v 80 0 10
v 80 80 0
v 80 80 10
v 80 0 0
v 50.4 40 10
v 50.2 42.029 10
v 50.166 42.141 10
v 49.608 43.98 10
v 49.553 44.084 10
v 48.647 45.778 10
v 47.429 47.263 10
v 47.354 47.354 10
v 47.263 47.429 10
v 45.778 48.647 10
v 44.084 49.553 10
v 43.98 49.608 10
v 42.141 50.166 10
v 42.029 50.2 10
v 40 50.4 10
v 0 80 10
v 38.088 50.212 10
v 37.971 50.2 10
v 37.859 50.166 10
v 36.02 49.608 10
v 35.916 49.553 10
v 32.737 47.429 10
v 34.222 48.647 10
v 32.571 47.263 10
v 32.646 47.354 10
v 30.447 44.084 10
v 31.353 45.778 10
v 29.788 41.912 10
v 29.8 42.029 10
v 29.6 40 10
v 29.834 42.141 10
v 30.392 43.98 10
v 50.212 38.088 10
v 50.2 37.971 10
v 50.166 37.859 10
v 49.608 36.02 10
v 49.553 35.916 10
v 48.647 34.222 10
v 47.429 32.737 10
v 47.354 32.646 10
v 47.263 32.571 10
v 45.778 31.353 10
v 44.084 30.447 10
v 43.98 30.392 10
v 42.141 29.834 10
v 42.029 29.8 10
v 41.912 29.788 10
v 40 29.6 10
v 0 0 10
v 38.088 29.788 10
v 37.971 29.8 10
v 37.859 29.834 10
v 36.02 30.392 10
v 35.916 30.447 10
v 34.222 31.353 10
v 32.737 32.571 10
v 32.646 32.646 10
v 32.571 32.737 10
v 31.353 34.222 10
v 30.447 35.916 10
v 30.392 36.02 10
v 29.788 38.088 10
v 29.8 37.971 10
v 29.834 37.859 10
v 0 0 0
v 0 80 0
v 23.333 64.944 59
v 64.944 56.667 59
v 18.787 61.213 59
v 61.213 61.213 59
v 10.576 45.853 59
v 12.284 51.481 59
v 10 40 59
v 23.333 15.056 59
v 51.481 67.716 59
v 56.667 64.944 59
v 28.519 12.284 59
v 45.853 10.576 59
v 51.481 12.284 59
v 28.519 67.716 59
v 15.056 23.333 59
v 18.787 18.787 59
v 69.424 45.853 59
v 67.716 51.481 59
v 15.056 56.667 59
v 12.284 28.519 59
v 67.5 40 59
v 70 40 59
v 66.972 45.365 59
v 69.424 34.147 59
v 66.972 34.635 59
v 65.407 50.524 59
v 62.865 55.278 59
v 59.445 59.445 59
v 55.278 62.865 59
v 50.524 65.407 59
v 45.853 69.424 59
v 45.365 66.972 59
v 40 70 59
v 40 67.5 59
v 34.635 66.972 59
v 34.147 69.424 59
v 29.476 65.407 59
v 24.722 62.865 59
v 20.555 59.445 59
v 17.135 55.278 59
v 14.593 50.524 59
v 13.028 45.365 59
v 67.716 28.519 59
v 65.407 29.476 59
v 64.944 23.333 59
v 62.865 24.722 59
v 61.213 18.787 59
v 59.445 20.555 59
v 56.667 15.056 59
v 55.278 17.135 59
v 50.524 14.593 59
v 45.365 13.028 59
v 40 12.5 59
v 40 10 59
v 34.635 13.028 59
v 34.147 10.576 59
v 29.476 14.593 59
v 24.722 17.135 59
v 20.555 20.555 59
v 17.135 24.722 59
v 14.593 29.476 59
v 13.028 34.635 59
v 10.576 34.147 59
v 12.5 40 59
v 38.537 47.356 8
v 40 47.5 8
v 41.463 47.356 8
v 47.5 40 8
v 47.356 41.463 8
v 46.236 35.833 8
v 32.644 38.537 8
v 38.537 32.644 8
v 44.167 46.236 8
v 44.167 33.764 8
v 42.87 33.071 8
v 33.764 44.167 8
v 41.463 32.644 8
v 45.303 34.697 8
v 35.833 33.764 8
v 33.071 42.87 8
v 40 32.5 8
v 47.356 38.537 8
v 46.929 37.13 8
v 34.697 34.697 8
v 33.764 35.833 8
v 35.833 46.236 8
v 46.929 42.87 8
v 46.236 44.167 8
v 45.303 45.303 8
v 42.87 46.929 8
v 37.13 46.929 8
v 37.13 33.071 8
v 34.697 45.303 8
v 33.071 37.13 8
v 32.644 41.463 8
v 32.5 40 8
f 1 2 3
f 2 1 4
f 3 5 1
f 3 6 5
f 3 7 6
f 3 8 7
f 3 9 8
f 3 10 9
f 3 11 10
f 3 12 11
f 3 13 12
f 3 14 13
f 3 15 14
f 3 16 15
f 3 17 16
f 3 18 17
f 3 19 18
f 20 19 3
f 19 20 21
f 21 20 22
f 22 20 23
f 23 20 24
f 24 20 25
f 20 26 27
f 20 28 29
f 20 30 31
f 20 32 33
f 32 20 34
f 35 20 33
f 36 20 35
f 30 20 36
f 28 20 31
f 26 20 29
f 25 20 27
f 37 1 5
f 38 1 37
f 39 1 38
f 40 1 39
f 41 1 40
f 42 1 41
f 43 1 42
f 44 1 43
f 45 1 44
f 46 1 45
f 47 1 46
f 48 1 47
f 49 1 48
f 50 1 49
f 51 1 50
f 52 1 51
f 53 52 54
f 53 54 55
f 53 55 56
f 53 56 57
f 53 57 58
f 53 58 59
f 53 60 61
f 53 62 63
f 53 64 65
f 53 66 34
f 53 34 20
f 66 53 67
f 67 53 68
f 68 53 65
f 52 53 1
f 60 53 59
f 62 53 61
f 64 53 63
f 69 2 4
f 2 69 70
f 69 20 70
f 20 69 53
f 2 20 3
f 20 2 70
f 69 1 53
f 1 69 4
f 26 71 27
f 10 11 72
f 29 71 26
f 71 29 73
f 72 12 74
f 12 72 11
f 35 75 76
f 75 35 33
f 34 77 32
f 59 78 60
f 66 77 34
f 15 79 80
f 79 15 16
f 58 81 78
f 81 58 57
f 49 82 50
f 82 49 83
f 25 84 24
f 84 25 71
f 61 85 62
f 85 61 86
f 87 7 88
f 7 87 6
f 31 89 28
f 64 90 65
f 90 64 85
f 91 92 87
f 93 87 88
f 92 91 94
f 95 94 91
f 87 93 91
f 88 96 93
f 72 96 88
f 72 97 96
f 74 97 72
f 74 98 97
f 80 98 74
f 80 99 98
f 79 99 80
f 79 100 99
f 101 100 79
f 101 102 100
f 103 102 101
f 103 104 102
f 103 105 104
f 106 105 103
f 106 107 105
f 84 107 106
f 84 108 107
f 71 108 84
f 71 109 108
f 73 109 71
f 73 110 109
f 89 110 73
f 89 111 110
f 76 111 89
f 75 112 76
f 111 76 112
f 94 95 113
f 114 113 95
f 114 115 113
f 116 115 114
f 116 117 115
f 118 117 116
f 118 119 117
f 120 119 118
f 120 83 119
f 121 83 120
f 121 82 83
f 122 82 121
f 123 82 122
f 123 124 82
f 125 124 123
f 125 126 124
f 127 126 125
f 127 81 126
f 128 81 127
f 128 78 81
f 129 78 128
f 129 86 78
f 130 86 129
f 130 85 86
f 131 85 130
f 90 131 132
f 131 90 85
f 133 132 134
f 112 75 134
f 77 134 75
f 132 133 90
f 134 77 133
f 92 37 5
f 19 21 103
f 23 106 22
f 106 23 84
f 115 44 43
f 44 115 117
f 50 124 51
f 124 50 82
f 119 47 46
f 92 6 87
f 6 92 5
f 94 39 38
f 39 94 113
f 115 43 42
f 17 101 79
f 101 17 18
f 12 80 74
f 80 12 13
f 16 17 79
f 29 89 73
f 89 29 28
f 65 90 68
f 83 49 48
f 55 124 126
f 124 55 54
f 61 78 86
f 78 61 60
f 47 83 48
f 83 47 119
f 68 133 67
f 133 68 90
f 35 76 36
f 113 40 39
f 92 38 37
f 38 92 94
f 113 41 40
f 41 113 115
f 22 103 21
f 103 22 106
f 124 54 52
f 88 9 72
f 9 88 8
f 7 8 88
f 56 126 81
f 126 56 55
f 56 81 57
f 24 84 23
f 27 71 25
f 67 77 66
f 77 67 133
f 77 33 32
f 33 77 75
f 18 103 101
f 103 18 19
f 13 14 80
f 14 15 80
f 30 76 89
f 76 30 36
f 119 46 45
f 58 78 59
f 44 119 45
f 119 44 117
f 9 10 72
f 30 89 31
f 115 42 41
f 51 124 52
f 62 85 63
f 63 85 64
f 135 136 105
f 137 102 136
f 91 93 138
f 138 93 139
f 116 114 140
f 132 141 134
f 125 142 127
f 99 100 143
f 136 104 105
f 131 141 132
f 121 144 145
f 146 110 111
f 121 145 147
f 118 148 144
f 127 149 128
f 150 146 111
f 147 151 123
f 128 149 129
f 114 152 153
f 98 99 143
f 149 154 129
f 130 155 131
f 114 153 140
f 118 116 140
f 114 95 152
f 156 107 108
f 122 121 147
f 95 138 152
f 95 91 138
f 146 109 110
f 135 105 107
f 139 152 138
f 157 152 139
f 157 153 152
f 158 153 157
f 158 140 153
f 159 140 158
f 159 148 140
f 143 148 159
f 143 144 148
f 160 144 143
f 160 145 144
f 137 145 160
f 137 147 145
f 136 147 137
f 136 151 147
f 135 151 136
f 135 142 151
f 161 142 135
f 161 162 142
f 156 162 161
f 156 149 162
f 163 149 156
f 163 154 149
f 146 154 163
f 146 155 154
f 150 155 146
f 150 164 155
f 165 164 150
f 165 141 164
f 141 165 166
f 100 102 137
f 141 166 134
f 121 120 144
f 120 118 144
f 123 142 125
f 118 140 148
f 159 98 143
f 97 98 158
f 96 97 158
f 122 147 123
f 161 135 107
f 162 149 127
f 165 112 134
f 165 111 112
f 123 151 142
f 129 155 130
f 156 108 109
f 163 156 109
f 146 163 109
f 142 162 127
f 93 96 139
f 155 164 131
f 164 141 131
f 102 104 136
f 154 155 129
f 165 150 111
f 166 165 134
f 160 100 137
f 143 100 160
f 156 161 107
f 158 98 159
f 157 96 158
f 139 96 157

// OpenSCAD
$fn = 32;

// ----------------------------------------------------------------------
// Hopper: funnel with square flange
// ----------------------------------------------------------------------

// --- parameters (mm) ---
fl = 80;                  // flange side, X and Y
fl_t = 10;                // flange thickness
cone_h = 50;              // cone height above the flange
top_d = 60;               // cone mouth diameter
bot_d = 20;               // cone spout diameter
wall = 2.5;               // cone wall thickness

bore_d = bot_d - 2 * wall;  // spout bore diameter
total_h = fl_t + cone_h - 1;  // overall height

difference() {
  union() {
    cube([fl, fl, fl_t]);
    translate([fl / 2, fl / 2, fl_t - 1])
      cylinder(h = cone_h, d1 = bot_d, d2 = top_d);
  }
  translate([fl / 2, fl / 2, fl_t - 2])
    cylinder(h = cone_h + 1, d1 = bore_d, d2 = top_d - 2 * wall);
}
